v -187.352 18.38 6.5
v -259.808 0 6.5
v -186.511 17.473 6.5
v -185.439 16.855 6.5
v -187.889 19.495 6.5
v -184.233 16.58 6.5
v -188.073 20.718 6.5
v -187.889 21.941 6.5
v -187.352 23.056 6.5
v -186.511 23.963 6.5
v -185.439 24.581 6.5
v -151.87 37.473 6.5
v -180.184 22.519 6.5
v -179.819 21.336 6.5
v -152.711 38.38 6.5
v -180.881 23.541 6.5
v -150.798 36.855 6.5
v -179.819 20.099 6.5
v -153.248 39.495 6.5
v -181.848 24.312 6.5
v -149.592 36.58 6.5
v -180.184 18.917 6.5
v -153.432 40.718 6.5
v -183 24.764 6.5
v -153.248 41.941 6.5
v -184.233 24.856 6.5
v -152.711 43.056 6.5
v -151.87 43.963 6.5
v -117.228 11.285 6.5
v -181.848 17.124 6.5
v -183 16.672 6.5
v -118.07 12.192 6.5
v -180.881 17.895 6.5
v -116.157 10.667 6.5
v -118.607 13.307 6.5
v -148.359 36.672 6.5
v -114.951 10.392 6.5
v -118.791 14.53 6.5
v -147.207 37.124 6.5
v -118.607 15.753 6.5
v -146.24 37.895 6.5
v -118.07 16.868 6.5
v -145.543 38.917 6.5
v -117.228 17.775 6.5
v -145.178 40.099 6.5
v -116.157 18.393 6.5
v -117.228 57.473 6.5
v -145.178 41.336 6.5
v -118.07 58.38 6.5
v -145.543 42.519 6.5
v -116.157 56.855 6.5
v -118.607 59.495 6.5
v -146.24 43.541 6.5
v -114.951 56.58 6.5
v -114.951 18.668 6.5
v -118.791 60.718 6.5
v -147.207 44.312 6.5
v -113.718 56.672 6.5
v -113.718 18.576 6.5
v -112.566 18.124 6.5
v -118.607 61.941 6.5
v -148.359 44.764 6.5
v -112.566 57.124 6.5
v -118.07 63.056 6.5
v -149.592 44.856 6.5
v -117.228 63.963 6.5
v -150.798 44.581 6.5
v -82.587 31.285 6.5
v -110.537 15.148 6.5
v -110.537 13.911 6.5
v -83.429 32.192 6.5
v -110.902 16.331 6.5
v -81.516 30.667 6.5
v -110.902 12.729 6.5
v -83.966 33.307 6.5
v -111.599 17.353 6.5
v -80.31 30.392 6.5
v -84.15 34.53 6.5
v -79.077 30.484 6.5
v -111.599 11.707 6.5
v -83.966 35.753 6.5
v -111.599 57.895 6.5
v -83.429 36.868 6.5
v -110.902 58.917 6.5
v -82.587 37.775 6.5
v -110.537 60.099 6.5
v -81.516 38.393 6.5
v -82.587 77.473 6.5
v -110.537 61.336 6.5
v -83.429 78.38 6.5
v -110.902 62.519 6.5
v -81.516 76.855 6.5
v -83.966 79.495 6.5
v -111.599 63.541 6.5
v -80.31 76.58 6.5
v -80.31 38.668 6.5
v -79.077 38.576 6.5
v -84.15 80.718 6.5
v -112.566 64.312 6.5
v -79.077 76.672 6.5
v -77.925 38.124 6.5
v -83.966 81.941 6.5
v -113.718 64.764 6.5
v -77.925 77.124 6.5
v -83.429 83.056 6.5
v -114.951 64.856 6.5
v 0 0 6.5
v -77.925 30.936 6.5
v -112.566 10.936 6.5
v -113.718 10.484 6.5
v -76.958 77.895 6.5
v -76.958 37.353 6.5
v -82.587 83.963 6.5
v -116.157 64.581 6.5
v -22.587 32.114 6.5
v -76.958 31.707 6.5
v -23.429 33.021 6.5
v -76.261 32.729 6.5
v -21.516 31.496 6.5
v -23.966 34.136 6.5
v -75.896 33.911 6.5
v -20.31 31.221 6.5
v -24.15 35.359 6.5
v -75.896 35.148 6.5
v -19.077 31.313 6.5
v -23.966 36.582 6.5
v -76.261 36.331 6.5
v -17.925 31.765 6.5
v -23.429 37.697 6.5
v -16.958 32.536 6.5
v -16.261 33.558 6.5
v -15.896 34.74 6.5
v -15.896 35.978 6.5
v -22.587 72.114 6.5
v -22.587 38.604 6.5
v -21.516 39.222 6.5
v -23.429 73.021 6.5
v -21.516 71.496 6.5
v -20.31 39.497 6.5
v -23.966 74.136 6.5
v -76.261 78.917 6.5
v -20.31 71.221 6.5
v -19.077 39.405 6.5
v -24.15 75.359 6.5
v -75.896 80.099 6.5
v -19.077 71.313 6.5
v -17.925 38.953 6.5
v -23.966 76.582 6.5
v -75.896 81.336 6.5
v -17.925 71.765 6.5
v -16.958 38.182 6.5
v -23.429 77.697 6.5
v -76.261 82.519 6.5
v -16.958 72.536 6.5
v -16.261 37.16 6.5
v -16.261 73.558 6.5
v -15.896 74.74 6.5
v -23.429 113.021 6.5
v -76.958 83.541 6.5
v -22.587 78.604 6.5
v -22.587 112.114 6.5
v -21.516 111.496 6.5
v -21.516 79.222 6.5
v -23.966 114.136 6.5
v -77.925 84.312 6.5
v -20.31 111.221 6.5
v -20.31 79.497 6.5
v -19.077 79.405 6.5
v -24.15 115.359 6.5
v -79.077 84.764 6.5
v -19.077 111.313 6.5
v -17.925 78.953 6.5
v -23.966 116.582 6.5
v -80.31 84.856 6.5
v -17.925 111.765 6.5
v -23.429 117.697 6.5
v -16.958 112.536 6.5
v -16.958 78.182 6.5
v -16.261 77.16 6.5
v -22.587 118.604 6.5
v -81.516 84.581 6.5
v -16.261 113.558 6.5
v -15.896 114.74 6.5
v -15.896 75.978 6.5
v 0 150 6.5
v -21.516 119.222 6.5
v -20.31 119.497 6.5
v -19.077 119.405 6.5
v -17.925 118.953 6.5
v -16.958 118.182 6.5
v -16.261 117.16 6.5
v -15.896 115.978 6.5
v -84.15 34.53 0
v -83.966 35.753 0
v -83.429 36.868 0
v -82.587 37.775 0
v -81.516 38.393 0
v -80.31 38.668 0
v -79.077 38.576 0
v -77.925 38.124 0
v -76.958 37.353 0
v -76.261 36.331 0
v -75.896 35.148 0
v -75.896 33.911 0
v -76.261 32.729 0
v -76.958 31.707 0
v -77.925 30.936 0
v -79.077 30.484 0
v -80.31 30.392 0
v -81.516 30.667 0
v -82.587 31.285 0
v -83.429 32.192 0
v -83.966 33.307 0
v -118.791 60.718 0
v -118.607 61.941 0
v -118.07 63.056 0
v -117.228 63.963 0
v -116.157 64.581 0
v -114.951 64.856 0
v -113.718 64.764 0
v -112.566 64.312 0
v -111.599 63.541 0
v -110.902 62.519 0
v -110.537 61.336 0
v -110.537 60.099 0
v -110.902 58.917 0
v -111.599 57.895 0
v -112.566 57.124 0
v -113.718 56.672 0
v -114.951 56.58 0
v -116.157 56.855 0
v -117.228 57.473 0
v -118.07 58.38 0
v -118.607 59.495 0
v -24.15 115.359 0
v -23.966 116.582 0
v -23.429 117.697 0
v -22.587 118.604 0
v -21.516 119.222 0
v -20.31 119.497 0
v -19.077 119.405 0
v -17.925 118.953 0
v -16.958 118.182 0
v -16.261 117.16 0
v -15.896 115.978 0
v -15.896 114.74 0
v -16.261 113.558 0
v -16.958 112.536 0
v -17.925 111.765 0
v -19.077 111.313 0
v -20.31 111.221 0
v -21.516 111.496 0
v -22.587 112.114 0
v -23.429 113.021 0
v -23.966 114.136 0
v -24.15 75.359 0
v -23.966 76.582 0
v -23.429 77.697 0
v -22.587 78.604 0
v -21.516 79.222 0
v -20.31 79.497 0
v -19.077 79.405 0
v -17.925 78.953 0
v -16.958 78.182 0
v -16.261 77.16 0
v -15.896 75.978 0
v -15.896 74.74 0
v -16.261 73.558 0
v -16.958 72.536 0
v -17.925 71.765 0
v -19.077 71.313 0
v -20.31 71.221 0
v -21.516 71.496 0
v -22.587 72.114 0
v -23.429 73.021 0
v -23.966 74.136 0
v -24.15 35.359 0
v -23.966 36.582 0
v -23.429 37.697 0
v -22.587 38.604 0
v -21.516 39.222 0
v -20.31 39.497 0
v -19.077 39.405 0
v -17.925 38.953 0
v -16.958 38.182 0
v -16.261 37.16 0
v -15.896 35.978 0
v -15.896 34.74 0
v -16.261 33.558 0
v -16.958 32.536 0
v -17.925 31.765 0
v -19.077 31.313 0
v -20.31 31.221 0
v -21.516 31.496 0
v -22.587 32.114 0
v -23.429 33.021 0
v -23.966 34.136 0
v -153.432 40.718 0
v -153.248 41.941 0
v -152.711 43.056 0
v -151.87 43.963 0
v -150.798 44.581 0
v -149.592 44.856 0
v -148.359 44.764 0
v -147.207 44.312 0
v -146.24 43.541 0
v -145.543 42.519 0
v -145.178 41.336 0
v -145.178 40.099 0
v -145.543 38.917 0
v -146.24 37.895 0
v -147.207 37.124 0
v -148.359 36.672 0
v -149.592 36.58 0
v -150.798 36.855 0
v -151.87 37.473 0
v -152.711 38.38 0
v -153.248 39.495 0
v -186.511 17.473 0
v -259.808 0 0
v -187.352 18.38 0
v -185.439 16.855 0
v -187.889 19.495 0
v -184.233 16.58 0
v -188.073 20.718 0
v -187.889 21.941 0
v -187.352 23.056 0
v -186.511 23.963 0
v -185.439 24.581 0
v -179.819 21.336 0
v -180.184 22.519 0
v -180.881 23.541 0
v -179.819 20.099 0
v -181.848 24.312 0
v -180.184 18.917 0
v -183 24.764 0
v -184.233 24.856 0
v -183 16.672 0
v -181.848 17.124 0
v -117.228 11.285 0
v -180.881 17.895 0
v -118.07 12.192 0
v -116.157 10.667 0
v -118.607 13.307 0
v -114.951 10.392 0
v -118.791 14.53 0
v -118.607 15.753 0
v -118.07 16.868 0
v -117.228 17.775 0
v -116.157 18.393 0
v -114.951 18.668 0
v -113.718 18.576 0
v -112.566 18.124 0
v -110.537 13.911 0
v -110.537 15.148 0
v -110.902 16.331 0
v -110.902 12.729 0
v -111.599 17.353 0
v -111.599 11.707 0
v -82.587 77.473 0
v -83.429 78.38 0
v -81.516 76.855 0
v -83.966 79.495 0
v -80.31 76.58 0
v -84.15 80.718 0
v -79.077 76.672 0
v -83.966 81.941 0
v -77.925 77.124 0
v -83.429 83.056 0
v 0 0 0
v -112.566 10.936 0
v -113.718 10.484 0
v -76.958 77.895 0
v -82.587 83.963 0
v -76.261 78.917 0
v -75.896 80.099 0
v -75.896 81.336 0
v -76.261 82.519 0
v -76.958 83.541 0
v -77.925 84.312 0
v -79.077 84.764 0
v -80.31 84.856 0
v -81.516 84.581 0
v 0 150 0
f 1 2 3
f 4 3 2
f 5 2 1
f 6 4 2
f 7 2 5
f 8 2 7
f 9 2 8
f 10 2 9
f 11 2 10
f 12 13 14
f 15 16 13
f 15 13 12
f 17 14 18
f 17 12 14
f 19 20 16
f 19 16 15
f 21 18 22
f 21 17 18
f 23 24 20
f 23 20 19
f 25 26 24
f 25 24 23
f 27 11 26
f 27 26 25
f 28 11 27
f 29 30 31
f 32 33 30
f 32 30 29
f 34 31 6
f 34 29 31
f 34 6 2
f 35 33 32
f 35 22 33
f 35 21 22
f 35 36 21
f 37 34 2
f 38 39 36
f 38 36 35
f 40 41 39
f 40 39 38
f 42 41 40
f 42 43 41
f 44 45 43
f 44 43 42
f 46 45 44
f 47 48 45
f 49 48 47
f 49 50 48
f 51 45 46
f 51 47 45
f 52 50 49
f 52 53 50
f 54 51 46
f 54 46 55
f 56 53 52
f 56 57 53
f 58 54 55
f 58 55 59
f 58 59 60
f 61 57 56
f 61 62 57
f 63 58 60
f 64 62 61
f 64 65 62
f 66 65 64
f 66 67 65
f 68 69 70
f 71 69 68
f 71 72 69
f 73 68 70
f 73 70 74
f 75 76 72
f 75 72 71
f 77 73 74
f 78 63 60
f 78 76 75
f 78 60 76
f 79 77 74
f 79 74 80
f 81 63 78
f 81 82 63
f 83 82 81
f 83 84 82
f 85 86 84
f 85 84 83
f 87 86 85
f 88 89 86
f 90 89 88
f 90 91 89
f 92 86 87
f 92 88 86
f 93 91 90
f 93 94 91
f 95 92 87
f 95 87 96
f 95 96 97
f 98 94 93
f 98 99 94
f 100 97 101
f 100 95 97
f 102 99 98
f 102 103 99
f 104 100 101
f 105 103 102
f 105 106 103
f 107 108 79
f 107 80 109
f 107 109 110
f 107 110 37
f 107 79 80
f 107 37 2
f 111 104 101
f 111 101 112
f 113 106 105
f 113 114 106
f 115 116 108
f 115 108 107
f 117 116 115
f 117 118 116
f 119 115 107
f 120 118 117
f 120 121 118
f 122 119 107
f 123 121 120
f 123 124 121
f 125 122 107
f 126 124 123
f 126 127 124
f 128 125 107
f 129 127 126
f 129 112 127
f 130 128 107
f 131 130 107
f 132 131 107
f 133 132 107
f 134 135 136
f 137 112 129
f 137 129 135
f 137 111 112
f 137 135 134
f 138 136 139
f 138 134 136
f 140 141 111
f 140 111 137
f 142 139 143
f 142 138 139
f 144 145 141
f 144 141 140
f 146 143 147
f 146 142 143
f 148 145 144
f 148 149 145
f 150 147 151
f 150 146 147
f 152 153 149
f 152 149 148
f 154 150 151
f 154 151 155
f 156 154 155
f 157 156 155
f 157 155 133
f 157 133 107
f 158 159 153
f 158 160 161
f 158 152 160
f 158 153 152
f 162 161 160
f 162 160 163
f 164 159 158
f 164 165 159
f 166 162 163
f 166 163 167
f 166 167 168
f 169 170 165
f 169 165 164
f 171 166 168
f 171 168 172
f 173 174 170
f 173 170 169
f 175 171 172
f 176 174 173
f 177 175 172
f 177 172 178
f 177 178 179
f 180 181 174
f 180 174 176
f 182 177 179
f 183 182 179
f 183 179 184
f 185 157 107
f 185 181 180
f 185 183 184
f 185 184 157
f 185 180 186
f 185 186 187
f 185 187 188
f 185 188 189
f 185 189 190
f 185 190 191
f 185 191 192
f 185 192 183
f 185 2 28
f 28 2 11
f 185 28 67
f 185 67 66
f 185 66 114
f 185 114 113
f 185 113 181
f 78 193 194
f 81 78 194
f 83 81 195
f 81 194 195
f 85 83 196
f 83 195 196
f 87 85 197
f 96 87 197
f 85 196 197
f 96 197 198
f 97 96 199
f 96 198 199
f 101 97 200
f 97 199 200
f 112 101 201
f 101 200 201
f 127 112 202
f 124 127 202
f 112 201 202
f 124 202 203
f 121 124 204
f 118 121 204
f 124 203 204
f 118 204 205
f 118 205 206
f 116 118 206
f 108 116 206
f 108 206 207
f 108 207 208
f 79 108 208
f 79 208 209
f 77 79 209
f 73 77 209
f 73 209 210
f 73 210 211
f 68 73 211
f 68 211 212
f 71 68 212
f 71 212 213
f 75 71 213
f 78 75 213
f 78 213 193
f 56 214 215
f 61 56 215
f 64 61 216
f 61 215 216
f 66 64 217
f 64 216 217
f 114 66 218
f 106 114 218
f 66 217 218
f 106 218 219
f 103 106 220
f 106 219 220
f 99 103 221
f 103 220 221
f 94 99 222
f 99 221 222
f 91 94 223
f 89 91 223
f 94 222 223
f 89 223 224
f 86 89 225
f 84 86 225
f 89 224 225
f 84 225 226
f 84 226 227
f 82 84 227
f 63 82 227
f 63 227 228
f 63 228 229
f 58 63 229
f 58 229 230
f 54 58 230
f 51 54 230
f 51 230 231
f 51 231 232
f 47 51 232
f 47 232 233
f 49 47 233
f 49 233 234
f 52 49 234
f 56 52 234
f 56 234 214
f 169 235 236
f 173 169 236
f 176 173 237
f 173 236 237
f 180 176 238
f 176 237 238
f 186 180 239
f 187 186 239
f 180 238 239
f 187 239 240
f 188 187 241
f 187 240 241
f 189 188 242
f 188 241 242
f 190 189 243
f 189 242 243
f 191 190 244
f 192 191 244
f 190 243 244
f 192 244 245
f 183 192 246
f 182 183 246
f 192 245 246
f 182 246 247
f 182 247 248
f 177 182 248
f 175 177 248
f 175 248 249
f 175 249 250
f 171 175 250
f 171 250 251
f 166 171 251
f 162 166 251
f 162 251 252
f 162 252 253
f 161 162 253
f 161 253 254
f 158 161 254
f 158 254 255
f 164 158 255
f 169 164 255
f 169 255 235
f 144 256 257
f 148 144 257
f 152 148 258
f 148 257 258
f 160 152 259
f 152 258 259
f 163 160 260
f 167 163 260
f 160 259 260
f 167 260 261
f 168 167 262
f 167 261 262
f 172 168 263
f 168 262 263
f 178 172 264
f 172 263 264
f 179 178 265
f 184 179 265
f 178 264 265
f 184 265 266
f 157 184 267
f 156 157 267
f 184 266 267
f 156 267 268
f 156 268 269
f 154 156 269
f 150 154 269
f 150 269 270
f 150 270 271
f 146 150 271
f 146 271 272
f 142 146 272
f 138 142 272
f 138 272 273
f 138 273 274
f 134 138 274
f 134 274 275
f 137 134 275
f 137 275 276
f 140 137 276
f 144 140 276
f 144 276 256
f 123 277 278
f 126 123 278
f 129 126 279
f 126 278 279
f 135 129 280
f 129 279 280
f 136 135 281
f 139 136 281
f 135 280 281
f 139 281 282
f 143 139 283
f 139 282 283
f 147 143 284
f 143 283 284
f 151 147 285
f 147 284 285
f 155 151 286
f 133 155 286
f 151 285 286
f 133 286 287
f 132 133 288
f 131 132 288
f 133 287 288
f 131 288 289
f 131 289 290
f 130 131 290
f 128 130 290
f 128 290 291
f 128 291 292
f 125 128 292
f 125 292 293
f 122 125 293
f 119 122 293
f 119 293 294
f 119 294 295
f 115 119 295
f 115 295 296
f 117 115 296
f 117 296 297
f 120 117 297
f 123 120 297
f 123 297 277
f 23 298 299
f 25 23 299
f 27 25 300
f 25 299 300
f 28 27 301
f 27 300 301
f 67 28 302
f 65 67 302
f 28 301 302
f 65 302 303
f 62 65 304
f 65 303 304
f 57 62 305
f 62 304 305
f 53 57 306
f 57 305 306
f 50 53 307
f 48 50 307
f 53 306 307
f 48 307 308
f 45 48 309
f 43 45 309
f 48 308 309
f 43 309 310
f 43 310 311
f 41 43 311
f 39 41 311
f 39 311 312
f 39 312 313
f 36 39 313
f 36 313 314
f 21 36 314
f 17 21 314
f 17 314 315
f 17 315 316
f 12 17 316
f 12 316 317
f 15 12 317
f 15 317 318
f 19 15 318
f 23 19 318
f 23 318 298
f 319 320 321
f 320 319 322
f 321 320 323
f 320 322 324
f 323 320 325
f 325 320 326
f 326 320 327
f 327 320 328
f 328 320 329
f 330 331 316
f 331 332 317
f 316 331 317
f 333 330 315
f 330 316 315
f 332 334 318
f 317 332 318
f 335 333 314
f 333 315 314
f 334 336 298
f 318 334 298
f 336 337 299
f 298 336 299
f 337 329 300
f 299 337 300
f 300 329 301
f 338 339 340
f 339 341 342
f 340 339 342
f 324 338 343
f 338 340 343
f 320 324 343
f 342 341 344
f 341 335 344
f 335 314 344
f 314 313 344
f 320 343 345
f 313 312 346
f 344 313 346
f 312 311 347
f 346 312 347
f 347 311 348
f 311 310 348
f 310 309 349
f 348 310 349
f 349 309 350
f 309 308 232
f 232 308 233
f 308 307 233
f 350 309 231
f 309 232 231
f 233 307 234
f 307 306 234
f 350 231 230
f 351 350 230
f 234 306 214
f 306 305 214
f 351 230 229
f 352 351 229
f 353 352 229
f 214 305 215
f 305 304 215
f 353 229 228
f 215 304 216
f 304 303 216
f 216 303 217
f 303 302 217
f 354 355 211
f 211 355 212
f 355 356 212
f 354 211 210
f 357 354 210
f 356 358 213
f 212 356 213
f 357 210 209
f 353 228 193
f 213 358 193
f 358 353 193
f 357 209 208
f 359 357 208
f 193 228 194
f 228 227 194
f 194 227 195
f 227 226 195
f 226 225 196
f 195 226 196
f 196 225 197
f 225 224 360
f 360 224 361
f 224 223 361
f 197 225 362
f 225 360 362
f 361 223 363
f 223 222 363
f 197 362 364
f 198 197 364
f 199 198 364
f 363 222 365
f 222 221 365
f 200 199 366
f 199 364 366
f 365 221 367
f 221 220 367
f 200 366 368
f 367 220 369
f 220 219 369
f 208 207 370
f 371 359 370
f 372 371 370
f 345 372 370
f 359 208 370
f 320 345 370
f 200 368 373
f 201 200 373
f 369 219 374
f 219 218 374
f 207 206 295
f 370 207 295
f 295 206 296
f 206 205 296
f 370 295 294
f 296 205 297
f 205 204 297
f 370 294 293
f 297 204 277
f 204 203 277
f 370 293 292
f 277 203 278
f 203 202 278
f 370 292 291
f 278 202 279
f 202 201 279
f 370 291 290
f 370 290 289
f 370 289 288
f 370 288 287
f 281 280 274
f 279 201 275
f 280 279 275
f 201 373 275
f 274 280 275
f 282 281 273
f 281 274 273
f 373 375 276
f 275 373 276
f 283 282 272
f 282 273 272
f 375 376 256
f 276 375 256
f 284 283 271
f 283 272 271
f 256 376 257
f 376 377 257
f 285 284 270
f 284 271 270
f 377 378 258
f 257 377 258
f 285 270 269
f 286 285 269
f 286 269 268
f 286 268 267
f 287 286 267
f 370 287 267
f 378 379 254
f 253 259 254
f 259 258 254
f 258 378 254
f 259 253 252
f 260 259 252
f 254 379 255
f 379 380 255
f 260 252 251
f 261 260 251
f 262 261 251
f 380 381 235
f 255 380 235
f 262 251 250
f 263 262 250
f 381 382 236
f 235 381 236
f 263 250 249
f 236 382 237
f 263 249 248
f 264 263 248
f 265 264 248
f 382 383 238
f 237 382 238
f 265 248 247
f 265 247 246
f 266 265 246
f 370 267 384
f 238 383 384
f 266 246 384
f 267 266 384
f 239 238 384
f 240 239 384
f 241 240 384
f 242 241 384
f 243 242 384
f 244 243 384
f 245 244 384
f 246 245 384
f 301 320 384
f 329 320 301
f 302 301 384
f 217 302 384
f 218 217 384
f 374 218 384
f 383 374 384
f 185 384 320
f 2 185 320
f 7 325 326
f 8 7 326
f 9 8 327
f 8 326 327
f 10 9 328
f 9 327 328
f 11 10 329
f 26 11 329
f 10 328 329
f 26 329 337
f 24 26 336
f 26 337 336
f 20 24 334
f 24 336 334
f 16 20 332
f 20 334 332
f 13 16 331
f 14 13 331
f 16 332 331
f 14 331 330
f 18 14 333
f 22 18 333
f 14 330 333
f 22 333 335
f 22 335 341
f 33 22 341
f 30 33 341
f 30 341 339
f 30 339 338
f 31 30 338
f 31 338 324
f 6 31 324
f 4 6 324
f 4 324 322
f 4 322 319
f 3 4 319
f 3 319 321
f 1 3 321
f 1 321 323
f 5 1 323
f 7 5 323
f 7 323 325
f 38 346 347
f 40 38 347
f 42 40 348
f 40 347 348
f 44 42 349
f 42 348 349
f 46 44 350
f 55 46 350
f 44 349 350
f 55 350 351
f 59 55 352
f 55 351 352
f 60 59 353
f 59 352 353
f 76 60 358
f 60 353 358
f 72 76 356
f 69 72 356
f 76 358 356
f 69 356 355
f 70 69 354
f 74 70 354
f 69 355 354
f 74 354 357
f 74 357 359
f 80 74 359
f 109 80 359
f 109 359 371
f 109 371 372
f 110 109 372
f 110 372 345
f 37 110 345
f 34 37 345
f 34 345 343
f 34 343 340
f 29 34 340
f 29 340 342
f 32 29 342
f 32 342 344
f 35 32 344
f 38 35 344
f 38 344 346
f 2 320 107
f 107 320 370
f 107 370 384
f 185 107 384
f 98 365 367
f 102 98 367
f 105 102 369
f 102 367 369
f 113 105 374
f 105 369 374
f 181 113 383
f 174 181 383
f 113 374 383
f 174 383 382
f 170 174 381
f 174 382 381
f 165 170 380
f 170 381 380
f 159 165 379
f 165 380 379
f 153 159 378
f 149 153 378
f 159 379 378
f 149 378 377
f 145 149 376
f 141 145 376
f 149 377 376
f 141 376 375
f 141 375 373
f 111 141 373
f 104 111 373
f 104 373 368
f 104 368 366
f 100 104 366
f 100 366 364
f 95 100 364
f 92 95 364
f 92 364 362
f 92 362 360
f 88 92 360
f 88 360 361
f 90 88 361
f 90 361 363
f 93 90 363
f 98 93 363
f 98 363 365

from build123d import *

# Parameters (mm, degrees)
F1_DEPTH = 6.5
F3_D     = 8.3


with BuildPart() as f1:
    # F0 (on Top) → F1 (new body)
    with BuildSketch(Plane.XY):
        Polygon((-259.8076211353, 0), (0, 0), (0, 150), align=None)
    extrude(amount=F1_DEPTH)

    # F3 (through all)
    with Locations(Plane.XY.offset(6.5)):
        with Locations((-80, 80.7179676972), (-114.6410161514, 60.7179676972), (-80, 34.5299461621), (-20, 115.3589838486), (-20, 75.3589838486), (-20, 35.3589838486), (-114.6410161514, 14.5299461621), (-149.2820323028, 40.7179676972), (-183.9230484541, 20.7179676972)):
            Hole(F3_D / 2)


solid = f1.part
